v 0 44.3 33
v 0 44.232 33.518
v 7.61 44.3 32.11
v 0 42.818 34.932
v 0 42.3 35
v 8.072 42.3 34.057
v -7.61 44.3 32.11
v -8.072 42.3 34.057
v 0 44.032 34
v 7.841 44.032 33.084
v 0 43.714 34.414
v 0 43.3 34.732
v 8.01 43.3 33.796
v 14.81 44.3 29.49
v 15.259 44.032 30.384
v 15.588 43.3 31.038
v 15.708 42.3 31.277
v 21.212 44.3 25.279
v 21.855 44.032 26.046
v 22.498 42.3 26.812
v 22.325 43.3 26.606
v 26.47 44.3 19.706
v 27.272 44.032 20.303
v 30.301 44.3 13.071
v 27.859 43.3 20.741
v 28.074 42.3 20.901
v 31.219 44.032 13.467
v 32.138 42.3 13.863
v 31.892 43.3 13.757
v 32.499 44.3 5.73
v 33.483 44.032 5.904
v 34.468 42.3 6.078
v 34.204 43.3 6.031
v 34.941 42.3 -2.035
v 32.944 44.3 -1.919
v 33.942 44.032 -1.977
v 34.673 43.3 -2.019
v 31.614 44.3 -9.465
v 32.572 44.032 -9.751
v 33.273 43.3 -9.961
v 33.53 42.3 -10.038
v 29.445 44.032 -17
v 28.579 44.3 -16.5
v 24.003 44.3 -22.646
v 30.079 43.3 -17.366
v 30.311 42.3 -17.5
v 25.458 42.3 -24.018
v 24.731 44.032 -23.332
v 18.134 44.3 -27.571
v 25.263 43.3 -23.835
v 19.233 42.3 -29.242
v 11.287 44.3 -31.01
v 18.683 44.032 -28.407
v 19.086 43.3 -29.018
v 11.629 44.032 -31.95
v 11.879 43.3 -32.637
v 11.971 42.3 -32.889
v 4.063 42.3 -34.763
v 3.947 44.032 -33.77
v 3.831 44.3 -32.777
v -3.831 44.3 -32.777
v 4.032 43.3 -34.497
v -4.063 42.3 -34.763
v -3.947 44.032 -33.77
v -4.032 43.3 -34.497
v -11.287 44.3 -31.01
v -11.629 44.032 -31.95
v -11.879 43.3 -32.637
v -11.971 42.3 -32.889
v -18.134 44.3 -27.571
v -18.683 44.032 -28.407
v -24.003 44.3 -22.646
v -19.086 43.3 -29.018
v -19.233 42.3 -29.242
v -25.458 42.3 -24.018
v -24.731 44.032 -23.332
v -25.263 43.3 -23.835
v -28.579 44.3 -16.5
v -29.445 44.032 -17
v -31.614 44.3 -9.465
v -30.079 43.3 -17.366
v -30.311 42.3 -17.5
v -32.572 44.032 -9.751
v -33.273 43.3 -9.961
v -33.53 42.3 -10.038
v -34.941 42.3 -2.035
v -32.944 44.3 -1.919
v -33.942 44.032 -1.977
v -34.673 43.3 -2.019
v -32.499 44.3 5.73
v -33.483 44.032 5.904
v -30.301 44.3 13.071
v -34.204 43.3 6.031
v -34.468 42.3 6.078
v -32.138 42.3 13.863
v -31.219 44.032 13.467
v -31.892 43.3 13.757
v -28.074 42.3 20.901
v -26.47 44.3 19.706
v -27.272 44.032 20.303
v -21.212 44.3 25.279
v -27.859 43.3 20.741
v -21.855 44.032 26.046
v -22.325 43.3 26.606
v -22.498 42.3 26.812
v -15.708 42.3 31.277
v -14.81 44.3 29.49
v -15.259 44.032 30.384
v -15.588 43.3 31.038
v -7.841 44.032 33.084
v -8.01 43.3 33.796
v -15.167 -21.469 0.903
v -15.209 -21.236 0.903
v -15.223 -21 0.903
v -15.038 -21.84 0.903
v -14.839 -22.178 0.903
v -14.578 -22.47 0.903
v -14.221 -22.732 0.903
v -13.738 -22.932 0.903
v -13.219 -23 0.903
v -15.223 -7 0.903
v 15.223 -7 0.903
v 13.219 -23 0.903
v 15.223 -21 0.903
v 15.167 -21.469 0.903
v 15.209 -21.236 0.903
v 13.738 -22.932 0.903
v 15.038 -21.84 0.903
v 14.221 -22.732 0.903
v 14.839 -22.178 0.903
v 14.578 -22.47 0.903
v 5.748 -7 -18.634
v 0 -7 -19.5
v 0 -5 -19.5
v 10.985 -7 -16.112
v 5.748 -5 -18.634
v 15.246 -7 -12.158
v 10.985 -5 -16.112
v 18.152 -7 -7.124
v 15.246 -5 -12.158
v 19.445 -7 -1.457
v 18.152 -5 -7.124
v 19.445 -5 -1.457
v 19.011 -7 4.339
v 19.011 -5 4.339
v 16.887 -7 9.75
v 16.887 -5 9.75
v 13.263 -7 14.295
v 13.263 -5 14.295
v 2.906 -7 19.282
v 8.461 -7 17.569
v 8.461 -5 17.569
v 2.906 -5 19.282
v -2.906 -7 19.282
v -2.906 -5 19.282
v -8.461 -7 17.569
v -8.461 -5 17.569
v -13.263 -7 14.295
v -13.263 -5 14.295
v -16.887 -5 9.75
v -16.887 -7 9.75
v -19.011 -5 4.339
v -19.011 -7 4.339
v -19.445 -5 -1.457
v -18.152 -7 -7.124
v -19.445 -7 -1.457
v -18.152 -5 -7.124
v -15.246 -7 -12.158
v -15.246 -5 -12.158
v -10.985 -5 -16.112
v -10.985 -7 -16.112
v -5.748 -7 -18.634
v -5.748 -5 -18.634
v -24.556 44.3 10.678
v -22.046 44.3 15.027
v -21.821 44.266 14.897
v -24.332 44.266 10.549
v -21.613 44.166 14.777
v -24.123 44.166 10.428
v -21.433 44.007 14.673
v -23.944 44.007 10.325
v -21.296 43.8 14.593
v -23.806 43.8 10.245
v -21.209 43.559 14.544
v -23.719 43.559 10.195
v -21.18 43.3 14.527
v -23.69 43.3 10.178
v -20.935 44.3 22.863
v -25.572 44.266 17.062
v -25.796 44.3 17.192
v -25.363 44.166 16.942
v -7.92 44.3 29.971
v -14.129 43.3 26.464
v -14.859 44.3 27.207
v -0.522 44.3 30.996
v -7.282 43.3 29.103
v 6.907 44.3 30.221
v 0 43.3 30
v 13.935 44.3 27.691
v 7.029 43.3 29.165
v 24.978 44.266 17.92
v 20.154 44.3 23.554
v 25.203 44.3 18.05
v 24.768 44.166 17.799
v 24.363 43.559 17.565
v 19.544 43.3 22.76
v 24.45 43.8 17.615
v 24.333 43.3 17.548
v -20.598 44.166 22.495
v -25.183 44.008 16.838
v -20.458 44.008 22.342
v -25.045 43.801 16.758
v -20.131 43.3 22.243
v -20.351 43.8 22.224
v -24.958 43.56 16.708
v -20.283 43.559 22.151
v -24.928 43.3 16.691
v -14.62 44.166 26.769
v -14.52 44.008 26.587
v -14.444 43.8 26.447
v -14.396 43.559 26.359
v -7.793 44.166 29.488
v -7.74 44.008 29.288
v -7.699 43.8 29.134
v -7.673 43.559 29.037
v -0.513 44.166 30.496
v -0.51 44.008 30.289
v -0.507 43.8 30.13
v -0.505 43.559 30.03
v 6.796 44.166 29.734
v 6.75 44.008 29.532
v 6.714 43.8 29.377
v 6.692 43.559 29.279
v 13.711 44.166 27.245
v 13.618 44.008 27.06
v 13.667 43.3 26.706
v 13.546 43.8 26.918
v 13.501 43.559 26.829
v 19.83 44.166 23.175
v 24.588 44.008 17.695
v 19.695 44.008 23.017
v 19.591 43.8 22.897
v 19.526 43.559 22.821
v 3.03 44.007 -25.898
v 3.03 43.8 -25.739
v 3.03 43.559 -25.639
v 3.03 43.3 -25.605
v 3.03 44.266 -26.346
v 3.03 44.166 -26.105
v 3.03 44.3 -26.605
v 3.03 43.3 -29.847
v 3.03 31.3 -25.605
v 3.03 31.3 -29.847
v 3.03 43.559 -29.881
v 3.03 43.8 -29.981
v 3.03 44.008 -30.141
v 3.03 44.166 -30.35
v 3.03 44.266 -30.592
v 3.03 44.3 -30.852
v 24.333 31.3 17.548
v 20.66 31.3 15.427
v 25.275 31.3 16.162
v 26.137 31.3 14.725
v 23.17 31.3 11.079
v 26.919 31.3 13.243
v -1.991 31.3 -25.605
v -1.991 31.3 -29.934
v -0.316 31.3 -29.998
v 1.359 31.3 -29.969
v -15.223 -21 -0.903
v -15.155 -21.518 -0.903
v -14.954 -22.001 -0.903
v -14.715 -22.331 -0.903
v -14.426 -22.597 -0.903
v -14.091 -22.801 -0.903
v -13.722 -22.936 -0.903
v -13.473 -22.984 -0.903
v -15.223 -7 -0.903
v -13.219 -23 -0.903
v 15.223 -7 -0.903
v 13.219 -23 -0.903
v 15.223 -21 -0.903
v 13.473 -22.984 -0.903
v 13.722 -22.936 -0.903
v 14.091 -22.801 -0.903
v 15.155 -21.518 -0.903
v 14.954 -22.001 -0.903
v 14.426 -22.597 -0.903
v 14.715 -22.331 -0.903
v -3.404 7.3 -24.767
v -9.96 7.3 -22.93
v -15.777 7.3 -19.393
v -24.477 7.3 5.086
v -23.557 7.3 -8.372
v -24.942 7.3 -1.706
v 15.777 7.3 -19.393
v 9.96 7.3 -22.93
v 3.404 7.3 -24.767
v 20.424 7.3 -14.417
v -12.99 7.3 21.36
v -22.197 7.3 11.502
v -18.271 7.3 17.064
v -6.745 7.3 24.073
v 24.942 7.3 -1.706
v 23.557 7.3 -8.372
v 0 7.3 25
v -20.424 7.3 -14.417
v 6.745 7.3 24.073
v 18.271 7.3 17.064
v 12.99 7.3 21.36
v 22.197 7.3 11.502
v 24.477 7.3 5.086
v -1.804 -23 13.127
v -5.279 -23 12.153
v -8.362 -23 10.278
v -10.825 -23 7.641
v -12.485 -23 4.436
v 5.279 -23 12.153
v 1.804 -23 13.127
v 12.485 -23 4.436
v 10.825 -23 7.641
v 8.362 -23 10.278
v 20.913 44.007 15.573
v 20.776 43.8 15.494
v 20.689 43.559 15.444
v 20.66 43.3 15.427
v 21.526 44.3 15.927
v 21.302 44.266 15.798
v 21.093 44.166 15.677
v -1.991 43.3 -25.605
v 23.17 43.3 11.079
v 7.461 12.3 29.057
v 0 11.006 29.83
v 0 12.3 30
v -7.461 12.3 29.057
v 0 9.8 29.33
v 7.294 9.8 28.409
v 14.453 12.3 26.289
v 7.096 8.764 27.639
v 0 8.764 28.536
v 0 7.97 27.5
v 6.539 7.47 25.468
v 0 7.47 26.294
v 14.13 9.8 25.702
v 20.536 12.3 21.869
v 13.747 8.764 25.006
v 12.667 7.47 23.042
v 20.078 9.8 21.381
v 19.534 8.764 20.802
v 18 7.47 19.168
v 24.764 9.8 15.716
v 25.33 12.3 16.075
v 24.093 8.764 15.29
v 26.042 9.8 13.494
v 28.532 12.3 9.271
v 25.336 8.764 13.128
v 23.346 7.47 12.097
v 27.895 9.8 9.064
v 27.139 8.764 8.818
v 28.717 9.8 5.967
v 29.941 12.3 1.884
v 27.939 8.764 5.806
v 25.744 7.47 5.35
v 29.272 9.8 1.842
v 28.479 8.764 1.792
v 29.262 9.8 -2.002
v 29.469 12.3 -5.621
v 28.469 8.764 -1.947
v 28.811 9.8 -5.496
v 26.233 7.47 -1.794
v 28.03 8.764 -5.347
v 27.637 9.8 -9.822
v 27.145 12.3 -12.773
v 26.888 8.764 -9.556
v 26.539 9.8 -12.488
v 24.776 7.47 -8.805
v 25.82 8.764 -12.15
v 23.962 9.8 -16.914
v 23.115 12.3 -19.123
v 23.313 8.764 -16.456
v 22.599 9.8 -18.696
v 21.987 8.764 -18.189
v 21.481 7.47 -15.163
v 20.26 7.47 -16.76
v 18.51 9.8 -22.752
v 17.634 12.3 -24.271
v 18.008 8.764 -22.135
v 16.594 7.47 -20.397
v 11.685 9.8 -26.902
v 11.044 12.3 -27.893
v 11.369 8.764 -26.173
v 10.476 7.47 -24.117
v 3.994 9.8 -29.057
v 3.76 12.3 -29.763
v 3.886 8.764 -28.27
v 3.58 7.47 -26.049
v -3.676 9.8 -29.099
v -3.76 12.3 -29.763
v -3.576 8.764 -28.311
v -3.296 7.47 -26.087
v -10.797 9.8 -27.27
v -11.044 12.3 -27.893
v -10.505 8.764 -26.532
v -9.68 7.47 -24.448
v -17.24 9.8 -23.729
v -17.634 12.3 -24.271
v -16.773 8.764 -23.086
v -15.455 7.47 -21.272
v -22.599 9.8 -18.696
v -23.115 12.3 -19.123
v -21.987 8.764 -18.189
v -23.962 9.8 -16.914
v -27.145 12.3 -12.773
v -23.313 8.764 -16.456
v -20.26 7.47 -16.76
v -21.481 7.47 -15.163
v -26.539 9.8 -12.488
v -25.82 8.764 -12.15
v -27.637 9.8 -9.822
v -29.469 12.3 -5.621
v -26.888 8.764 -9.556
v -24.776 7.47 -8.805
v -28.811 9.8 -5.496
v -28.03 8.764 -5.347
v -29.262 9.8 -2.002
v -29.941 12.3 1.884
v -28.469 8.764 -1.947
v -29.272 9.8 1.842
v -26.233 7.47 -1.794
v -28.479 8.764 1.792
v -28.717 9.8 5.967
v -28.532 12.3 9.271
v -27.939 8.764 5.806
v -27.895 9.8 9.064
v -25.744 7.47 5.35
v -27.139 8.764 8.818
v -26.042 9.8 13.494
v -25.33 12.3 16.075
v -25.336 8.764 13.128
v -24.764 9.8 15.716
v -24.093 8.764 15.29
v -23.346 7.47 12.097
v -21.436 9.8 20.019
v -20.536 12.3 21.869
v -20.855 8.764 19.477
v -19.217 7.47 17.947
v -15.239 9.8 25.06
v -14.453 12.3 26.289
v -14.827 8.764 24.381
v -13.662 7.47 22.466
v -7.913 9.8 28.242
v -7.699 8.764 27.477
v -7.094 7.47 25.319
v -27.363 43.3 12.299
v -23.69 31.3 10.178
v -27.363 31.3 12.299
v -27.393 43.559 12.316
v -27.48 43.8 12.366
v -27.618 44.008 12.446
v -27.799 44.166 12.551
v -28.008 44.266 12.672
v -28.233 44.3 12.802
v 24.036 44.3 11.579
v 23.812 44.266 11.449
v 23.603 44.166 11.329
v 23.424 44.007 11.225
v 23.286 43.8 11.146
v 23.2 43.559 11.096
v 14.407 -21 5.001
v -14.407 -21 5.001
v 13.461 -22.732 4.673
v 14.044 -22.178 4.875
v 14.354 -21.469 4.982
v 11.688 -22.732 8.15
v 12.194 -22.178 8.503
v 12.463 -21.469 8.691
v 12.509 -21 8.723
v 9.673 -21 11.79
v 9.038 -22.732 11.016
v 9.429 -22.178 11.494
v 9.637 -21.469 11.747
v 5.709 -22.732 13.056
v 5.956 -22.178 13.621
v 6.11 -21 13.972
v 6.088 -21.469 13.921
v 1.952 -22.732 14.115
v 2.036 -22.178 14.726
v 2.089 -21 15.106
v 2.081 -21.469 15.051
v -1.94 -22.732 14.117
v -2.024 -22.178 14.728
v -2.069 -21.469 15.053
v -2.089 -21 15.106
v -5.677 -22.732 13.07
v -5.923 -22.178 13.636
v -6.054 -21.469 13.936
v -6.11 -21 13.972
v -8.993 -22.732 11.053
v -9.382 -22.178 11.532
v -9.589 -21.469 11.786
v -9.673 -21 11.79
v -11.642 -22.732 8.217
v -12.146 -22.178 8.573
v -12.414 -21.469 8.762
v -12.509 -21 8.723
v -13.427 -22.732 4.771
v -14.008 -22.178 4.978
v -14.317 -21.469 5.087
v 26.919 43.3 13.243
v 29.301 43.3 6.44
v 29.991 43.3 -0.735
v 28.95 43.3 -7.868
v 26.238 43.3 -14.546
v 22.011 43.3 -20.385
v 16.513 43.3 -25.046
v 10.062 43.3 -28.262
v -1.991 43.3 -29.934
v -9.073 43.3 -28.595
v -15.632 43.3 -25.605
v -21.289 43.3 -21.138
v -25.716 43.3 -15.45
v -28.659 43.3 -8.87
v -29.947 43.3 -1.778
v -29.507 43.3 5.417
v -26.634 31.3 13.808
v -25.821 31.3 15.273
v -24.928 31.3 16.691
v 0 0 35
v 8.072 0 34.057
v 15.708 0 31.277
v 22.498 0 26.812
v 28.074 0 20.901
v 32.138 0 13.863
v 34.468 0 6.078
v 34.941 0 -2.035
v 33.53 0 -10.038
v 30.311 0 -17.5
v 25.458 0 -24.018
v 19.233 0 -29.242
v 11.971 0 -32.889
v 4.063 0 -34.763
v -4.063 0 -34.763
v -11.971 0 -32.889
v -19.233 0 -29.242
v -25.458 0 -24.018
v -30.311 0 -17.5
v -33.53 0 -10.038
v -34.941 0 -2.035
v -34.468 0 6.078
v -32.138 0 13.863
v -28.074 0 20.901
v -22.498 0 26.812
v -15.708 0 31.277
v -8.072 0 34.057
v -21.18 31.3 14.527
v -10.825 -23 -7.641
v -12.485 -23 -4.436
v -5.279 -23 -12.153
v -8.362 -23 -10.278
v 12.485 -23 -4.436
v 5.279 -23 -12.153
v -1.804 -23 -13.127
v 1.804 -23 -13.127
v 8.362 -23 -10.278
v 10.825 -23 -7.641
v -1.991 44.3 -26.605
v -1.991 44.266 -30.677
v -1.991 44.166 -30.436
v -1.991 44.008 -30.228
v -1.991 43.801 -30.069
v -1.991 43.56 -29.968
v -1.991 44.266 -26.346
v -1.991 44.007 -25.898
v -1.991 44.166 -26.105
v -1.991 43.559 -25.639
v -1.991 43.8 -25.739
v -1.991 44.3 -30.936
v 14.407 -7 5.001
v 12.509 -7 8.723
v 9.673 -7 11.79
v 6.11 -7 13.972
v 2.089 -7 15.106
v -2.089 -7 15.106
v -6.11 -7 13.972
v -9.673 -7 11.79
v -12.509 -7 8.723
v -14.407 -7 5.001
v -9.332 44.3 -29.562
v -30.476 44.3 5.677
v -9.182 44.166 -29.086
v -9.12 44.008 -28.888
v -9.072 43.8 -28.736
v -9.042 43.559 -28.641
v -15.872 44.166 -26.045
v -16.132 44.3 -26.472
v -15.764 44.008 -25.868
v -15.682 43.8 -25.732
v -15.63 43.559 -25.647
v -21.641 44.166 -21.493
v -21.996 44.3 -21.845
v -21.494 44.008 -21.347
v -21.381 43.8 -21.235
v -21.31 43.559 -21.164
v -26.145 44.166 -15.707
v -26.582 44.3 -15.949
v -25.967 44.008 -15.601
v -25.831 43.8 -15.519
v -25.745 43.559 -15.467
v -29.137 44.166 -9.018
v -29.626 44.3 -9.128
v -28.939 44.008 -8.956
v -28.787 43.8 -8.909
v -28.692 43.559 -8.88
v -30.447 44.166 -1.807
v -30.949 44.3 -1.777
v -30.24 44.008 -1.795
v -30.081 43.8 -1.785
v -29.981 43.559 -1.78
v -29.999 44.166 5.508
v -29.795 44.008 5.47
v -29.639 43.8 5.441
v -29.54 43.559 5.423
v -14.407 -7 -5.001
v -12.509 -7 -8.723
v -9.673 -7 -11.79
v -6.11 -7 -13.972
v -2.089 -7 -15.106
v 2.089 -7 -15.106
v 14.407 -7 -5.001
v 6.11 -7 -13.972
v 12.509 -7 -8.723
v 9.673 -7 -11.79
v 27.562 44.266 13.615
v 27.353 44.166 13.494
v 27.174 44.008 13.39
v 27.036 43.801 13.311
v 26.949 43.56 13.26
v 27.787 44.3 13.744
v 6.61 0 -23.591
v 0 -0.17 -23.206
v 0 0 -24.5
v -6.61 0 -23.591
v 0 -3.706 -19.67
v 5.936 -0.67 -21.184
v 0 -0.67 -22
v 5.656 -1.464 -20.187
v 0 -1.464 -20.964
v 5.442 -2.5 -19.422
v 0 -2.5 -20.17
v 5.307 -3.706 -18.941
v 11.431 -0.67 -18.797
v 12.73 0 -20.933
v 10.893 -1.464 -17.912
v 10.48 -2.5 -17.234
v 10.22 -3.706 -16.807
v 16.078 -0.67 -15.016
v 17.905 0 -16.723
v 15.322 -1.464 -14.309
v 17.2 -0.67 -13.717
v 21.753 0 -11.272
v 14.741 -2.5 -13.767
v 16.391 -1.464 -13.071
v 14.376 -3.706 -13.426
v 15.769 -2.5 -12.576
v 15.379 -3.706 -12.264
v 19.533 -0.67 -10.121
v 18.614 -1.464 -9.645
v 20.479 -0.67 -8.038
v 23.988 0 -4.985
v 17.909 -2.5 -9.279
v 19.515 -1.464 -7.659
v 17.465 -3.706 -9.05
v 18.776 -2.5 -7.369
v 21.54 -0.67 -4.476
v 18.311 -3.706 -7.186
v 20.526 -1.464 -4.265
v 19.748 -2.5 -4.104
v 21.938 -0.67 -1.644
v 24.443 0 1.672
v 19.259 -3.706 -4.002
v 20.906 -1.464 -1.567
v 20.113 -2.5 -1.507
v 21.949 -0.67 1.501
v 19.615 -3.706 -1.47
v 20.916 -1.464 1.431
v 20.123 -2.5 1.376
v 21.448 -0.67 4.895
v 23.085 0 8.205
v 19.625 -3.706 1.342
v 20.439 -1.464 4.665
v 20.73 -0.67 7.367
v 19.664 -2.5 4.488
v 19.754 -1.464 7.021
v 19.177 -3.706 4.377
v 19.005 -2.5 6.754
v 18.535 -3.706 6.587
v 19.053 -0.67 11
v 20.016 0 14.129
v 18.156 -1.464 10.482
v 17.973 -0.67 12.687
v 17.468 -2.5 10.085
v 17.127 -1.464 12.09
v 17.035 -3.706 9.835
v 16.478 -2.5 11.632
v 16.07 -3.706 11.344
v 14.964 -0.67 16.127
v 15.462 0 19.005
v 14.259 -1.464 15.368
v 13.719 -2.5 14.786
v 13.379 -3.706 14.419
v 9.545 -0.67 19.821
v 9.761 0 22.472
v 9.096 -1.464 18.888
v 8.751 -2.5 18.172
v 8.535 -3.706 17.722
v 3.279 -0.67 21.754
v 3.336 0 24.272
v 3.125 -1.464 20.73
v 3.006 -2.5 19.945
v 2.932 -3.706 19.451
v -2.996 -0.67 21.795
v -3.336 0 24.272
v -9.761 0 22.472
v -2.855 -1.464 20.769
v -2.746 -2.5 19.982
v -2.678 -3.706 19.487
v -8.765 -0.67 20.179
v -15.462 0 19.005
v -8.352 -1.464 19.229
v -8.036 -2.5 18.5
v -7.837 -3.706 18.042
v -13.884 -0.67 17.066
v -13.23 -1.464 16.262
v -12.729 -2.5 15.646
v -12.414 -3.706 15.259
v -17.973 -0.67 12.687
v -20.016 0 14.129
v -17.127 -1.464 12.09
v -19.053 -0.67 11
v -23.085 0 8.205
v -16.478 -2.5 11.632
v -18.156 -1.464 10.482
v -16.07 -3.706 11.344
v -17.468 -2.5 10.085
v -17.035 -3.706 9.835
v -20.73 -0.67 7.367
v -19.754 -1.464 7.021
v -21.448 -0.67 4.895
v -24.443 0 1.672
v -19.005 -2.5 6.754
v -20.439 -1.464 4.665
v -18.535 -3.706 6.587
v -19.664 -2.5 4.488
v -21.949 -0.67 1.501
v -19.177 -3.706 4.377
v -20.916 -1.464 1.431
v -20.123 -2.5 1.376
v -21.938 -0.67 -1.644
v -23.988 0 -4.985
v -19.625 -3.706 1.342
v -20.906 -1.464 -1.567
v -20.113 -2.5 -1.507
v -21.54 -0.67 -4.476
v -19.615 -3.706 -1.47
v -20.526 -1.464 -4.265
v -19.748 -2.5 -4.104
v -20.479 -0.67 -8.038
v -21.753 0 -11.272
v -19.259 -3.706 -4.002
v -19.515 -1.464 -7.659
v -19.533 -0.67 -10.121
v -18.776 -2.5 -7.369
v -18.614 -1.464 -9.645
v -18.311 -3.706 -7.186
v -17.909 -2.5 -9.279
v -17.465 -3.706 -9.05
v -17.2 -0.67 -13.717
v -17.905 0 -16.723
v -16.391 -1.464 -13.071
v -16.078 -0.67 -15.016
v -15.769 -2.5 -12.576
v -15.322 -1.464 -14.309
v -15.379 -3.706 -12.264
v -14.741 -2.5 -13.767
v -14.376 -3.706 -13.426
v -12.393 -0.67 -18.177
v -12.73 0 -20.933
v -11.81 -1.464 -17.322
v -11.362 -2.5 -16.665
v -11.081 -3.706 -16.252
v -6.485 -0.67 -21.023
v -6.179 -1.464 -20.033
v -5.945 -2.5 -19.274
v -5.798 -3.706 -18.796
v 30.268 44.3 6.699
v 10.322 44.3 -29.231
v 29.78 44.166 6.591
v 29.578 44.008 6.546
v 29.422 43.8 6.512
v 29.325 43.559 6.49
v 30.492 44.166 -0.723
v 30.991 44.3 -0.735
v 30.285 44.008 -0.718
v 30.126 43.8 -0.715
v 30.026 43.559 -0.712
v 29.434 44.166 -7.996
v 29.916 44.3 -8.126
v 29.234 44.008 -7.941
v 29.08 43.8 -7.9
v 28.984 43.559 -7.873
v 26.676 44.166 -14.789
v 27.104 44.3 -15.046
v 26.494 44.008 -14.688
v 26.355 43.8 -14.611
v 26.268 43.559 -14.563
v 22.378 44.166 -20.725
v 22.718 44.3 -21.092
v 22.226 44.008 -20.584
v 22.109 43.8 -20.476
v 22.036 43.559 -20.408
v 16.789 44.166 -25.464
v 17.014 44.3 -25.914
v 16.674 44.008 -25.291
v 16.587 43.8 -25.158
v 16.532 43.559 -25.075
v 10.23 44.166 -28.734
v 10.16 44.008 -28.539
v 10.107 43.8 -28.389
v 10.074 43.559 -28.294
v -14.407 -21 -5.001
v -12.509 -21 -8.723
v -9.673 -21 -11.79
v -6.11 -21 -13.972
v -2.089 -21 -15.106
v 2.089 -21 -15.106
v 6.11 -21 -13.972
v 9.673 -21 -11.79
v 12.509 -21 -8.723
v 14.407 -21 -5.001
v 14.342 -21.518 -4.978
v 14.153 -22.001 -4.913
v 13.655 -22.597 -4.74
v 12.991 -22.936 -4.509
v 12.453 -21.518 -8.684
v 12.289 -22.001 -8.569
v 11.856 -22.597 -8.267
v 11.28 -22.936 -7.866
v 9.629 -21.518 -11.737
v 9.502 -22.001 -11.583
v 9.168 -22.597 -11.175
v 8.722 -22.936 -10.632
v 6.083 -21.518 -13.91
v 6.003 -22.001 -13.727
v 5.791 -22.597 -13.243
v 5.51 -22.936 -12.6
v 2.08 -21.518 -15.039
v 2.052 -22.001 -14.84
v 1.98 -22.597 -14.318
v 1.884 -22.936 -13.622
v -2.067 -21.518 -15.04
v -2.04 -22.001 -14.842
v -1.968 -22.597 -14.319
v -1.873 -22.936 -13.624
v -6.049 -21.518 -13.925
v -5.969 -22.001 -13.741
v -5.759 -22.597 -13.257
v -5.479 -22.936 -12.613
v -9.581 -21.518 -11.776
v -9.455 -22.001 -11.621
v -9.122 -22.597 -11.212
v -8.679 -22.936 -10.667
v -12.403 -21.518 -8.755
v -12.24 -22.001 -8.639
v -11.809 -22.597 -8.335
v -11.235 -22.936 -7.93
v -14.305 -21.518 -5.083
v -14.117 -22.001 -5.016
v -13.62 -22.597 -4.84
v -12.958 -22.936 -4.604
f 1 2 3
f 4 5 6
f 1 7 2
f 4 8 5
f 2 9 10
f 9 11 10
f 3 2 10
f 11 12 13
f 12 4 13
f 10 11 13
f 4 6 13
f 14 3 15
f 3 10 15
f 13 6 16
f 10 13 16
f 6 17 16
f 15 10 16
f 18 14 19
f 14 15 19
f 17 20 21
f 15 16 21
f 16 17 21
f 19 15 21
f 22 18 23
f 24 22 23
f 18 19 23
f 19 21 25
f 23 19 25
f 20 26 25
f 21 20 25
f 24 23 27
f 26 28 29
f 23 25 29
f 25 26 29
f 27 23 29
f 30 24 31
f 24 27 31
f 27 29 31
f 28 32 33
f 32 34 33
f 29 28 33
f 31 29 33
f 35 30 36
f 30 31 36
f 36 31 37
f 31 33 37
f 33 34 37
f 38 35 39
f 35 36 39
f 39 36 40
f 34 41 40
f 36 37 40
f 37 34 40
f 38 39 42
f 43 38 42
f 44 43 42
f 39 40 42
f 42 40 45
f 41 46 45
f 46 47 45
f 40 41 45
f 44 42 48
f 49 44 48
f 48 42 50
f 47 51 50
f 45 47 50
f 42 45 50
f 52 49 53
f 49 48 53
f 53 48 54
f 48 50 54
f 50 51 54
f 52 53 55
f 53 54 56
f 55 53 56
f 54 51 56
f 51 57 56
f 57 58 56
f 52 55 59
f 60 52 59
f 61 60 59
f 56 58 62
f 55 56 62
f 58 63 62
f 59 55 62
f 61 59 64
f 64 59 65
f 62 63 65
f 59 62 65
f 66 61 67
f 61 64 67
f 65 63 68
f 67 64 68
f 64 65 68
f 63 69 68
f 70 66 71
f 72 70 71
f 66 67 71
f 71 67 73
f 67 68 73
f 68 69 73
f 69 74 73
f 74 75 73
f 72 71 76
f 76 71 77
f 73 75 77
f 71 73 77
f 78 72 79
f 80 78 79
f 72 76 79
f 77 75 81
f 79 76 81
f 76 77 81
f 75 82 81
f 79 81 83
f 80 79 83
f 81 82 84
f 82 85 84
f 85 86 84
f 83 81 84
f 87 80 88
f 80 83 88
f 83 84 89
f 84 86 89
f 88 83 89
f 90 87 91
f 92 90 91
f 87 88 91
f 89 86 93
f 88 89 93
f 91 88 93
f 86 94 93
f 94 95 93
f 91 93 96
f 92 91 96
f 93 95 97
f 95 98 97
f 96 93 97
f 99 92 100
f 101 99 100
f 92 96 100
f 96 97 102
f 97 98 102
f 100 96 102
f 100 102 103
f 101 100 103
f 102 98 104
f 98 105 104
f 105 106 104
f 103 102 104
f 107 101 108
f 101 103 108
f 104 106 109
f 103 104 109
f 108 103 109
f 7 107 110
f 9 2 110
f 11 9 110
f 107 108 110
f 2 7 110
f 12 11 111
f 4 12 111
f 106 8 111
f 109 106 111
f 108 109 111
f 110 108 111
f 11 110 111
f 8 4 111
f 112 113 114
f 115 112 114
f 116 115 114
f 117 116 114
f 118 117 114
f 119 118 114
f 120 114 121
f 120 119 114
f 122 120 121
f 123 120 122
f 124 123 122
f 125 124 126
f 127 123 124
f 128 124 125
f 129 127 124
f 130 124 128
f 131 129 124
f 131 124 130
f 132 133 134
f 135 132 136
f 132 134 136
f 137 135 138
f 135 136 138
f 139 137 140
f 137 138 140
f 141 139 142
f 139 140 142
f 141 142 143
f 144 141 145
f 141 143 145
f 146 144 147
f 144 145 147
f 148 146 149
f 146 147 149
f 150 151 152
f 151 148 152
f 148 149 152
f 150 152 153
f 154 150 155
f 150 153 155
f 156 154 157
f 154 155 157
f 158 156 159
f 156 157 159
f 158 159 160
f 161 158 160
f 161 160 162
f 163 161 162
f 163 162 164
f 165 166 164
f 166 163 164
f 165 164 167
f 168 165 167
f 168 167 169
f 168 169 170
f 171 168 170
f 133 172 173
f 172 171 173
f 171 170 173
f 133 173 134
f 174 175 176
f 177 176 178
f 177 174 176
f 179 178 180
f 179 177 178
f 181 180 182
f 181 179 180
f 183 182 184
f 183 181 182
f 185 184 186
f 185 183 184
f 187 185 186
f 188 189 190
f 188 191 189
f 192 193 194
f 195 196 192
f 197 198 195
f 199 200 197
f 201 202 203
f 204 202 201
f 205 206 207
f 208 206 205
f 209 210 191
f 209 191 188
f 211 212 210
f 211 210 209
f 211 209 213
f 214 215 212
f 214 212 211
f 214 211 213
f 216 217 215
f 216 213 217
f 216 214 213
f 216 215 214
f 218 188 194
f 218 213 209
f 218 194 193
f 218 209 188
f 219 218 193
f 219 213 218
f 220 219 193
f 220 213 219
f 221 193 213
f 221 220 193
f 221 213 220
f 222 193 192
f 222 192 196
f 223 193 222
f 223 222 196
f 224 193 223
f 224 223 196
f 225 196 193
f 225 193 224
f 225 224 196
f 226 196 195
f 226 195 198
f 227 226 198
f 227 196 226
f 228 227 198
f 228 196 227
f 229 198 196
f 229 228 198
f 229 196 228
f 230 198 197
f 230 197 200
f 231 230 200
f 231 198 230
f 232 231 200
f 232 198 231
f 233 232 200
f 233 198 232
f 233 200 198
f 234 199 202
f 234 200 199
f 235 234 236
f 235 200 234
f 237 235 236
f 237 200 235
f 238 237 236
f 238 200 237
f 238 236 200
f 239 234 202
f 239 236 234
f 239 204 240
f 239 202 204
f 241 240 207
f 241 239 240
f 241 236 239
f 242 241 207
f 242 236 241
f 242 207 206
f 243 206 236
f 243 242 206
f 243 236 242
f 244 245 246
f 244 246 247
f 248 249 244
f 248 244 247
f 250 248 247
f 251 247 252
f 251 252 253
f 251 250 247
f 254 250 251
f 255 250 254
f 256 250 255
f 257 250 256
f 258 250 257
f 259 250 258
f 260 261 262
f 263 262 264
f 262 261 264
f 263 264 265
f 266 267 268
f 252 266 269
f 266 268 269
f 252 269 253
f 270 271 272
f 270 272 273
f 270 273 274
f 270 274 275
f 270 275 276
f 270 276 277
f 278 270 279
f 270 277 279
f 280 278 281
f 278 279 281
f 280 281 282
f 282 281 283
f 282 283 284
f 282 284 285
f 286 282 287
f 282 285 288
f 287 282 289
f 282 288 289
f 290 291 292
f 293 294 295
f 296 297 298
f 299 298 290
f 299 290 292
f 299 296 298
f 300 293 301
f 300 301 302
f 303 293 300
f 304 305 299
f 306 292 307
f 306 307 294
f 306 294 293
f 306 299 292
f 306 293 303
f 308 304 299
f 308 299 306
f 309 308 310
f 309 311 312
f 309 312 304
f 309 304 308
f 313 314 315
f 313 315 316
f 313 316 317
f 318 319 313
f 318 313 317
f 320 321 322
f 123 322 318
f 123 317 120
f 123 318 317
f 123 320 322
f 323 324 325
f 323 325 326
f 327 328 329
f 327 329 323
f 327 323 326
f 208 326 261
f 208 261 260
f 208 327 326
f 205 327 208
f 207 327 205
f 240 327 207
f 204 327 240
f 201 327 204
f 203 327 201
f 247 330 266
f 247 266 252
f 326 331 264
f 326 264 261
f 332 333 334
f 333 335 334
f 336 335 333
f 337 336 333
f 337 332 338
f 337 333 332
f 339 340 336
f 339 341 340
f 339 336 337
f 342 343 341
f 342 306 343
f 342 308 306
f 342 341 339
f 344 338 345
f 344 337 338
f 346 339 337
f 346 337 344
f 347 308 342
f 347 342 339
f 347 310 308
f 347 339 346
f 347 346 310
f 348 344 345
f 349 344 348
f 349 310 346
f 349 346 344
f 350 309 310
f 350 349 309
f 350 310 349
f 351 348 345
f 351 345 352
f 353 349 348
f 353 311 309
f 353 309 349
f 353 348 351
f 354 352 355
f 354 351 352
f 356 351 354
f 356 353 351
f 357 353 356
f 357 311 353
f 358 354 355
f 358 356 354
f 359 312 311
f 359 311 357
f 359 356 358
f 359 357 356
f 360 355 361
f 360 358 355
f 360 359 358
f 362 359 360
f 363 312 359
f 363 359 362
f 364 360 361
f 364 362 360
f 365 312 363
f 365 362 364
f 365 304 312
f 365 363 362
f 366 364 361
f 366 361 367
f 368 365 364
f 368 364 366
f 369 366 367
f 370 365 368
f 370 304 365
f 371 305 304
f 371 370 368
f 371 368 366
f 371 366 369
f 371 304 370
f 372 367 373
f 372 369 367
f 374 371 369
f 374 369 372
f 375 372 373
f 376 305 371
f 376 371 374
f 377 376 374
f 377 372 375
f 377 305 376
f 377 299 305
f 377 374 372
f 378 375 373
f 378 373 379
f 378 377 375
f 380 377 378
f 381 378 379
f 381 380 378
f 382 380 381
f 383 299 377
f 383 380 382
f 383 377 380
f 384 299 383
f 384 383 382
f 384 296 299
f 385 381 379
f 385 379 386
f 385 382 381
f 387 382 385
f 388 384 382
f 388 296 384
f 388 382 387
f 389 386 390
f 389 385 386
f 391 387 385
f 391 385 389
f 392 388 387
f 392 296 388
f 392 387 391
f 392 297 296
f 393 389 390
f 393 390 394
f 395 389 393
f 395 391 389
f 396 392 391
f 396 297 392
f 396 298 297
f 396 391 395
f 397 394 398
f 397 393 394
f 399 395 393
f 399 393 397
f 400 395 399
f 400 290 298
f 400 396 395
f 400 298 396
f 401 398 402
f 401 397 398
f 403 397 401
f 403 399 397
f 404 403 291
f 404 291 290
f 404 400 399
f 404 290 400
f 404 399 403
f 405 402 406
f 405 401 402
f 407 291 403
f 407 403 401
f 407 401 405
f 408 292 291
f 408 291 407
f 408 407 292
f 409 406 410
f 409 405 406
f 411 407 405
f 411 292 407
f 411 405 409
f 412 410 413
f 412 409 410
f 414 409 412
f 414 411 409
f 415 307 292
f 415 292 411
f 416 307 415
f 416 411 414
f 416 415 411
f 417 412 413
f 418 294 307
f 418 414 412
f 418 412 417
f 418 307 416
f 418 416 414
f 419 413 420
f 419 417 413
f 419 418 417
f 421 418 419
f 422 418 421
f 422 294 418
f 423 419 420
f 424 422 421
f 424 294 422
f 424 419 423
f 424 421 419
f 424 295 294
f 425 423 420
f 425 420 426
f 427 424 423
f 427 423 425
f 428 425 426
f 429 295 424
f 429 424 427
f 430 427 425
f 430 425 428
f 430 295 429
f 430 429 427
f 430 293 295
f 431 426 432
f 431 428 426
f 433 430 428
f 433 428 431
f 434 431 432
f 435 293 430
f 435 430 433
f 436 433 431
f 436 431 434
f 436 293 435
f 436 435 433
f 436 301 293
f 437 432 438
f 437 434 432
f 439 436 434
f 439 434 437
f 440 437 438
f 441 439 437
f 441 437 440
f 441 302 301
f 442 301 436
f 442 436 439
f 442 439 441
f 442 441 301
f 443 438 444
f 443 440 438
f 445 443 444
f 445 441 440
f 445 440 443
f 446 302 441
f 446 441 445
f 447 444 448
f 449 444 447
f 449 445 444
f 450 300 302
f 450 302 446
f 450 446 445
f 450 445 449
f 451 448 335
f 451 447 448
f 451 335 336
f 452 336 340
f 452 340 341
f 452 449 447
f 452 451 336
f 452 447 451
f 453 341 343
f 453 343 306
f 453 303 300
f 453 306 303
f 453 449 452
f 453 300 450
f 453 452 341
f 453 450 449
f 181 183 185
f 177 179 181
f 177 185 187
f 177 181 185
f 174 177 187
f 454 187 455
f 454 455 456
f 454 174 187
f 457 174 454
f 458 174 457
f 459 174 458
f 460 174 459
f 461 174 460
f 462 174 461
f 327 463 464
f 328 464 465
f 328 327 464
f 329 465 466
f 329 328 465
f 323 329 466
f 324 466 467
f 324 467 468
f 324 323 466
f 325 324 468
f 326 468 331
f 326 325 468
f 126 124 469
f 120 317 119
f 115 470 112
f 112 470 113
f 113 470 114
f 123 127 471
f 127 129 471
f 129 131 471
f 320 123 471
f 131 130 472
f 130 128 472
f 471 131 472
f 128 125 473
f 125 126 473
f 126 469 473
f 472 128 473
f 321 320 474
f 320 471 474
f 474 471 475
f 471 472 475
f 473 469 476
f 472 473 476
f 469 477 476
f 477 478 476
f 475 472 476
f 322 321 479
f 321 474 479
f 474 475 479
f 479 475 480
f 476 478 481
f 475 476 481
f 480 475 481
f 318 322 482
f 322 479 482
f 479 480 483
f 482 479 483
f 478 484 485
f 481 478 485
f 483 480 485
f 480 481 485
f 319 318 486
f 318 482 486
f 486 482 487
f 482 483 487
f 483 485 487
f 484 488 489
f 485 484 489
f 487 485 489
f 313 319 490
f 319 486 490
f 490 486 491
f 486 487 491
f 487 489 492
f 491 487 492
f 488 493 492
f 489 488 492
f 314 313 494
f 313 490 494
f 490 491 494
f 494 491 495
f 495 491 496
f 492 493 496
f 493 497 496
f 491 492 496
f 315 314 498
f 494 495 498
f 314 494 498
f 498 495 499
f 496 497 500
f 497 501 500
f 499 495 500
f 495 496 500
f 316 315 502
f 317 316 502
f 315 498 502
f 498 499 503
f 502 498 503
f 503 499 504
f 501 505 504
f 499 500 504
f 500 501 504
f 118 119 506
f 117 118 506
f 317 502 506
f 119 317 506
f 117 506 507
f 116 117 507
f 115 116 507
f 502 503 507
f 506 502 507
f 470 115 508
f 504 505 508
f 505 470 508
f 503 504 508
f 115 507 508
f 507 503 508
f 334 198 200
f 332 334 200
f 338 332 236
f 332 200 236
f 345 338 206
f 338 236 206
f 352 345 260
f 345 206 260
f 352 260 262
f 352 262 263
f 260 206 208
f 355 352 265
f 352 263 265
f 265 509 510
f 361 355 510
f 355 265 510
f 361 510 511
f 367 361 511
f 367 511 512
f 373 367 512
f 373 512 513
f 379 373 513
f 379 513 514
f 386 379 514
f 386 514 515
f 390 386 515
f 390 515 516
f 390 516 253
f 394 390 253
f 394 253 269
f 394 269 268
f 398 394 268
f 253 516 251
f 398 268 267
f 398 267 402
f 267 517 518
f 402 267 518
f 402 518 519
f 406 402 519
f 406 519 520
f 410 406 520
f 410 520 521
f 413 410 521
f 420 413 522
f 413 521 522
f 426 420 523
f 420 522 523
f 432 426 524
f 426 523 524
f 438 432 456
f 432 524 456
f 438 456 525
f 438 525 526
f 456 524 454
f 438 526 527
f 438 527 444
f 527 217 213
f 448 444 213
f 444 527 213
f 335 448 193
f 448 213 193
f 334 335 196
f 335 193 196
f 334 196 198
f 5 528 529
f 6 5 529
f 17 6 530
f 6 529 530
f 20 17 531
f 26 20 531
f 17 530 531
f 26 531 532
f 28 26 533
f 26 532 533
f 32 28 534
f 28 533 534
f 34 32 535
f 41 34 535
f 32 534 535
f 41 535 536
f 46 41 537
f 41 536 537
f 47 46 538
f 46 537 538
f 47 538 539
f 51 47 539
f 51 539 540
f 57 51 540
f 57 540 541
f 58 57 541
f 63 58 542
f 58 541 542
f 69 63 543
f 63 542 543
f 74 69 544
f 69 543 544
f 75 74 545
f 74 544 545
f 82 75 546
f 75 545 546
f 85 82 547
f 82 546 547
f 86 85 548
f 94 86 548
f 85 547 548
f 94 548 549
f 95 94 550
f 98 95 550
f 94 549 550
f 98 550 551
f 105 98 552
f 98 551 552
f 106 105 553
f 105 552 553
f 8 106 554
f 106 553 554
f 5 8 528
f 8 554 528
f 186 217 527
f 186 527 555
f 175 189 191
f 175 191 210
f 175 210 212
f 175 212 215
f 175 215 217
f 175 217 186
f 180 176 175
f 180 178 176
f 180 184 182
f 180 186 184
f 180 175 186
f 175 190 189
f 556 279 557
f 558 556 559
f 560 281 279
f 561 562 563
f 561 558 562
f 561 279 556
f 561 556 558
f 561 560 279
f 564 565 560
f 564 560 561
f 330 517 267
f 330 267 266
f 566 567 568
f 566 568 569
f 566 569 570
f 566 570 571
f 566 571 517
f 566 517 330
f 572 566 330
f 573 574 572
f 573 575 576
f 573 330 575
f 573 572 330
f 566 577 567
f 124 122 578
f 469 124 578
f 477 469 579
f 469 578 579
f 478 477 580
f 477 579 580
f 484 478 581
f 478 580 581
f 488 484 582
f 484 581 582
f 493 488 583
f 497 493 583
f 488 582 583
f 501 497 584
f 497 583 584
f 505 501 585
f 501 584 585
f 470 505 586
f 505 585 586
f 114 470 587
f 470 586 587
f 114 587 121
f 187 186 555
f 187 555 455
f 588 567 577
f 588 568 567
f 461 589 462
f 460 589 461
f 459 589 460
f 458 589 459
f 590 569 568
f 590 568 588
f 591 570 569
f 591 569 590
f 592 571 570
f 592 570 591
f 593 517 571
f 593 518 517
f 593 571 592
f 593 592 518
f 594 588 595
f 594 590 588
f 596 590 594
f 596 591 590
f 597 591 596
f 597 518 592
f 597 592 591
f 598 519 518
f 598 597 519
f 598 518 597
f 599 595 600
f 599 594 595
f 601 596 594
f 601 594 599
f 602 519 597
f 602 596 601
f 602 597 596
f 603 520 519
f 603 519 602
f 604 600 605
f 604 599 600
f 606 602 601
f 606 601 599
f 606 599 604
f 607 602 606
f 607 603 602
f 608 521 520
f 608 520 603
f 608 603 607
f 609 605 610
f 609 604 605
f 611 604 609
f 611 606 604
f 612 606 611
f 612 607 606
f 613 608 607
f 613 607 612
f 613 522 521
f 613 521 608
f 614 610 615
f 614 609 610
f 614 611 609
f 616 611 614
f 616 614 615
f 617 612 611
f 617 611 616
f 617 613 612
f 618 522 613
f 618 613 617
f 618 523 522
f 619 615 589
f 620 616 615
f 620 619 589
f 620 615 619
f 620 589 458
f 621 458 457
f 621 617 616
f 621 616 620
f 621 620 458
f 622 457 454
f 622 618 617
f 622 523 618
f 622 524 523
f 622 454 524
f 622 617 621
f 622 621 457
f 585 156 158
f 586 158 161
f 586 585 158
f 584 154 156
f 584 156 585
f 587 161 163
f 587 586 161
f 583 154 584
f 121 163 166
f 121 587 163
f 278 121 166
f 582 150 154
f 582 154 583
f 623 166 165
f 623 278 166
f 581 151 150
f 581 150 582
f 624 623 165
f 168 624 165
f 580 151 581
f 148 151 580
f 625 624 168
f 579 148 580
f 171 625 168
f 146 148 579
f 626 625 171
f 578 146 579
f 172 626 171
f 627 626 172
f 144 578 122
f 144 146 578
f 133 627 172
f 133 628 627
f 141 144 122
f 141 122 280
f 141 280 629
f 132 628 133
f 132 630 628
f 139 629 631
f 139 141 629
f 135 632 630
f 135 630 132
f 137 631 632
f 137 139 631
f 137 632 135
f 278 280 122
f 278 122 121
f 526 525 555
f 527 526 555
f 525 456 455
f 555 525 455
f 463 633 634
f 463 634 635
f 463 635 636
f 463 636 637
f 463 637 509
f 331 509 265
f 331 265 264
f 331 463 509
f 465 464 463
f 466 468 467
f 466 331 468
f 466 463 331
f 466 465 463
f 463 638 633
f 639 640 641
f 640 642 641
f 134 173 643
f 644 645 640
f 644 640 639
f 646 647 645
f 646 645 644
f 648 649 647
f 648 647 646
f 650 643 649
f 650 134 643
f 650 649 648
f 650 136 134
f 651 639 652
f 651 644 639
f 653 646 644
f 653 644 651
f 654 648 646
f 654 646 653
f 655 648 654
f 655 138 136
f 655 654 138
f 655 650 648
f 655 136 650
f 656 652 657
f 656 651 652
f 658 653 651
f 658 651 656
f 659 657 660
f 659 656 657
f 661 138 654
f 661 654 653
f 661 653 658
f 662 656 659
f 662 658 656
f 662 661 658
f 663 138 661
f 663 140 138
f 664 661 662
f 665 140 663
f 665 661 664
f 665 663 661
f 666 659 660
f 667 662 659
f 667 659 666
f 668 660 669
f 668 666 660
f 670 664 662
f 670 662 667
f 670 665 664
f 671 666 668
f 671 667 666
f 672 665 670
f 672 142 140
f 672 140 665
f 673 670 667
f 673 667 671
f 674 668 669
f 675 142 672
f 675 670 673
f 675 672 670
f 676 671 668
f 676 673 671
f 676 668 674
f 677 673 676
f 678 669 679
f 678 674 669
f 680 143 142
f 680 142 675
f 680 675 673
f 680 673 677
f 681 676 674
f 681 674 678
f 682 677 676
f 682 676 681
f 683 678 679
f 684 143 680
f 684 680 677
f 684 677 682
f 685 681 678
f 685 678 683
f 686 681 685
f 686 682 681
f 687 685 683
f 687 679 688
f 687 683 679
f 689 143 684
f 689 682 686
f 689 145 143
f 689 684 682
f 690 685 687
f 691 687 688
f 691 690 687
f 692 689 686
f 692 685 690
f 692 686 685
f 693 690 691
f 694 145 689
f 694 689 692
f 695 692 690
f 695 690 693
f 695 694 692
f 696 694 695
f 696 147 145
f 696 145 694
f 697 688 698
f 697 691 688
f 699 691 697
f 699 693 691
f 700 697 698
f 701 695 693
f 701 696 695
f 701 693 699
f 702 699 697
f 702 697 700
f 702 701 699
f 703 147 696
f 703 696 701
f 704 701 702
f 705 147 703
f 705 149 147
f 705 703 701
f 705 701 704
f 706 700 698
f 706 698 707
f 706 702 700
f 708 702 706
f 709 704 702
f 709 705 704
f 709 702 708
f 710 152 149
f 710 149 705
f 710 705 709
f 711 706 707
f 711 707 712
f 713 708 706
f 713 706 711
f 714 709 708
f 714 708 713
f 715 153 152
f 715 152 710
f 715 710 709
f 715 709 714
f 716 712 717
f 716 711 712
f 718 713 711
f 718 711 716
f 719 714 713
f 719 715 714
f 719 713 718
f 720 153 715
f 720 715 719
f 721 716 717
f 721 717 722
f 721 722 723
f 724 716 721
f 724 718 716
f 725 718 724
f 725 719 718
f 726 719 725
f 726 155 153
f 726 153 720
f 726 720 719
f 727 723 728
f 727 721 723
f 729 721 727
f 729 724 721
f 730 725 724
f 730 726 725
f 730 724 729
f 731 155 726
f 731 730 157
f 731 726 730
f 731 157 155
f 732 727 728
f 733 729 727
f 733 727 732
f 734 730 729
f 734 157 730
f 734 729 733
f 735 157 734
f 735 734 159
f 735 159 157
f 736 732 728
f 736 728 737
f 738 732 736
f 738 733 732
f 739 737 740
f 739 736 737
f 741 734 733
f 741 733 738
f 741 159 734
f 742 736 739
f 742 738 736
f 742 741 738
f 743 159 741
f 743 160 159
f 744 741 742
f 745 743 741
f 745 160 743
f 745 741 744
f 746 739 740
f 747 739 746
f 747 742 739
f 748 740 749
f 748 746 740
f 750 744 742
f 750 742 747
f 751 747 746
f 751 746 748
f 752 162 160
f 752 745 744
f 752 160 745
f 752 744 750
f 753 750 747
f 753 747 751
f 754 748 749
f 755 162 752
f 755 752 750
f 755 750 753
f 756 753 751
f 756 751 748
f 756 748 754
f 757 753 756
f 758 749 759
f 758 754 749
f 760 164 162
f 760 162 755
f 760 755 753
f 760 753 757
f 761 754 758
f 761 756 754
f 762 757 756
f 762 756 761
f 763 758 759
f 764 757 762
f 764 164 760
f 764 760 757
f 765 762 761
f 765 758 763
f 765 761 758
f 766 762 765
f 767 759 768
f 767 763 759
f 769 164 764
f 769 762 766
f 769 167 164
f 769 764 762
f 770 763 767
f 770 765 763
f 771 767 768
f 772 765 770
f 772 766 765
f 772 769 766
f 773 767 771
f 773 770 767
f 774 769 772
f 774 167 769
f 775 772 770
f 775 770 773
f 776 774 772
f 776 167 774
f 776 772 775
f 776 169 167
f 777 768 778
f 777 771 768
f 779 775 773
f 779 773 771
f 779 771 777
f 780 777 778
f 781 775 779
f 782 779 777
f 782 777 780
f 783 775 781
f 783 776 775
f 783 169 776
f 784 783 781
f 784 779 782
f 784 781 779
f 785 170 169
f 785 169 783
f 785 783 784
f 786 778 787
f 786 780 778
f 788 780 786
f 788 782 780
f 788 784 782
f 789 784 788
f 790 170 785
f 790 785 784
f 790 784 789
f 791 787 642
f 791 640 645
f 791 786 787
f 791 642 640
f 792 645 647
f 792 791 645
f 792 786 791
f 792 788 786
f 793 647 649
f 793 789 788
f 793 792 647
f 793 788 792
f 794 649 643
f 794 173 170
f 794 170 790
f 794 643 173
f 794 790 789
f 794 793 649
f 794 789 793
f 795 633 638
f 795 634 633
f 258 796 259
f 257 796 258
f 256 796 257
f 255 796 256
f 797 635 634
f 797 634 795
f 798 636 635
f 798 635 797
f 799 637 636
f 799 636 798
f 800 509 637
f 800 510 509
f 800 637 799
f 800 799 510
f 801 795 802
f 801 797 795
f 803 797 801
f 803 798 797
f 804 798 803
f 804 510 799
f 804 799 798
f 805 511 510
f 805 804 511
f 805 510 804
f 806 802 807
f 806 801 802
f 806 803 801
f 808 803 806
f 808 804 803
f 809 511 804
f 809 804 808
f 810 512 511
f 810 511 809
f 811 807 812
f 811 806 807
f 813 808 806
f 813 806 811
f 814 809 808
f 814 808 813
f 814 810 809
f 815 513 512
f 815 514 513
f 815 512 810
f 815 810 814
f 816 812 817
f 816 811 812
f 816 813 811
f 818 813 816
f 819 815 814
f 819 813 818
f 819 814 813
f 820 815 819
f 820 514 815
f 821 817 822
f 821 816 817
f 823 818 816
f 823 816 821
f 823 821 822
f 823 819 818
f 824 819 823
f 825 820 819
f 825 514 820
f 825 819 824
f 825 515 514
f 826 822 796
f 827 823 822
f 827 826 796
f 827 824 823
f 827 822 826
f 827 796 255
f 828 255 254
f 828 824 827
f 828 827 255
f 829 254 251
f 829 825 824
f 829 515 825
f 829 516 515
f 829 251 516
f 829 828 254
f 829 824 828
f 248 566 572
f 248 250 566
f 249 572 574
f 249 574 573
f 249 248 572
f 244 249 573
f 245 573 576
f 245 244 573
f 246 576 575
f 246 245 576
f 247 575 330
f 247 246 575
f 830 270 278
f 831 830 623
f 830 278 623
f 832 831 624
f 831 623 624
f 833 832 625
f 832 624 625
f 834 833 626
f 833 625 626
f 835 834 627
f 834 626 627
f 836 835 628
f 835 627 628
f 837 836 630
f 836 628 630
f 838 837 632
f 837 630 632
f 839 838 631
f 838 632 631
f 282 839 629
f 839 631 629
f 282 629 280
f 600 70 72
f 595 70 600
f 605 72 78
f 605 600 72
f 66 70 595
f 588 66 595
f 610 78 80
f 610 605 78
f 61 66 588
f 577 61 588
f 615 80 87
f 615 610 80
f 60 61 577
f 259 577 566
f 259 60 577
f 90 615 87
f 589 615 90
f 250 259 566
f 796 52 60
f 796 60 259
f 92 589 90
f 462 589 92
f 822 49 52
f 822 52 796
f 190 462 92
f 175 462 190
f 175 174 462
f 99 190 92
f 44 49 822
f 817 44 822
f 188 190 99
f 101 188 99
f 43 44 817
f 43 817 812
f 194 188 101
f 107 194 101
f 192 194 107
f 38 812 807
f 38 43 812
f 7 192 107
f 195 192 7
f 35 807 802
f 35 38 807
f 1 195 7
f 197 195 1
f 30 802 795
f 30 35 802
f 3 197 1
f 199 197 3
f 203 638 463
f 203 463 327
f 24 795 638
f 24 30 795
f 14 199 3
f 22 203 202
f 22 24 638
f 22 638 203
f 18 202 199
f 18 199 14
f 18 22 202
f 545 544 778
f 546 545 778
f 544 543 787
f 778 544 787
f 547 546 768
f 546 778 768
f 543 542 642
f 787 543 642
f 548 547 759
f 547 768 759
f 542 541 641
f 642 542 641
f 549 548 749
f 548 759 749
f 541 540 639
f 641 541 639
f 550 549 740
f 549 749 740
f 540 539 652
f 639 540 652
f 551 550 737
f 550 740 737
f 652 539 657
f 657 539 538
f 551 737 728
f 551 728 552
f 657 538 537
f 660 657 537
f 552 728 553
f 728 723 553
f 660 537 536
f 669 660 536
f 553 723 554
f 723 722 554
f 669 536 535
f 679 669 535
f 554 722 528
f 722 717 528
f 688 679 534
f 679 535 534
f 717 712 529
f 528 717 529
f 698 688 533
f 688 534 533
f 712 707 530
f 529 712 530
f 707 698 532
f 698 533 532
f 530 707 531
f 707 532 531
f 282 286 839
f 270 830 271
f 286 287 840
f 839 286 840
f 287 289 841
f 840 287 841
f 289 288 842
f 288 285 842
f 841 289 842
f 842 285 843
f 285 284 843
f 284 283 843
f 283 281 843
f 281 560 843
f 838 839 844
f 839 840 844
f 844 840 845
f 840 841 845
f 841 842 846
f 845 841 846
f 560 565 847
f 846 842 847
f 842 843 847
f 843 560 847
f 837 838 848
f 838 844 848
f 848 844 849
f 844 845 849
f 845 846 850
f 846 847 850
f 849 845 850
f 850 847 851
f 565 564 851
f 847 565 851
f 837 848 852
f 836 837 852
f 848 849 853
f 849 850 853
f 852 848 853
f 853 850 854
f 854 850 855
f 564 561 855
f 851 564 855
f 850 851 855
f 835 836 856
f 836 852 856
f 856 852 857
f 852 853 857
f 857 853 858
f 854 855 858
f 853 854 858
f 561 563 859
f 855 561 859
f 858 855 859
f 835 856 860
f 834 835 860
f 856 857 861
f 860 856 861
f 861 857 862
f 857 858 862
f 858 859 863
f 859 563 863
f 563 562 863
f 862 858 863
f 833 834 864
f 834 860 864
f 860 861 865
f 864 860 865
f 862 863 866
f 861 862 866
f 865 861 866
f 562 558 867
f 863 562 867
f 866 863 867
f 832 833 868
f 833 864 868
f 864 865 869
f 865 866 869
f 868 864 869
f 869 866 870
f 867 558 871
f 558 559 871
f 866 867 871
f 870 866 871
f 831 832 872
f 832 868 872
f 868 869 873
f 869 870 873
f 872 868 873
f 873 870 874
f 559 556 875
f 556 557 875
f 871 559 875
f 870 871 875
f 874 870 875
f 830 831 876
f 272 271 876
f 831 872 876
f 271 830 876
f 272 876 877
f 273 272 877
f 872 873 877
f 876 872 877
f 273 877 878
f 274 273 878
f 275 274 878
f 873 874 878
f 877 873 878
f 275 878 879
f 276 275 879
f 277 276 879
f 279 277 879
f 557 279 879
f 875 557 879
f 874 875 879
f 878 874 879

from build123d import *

# Parameters (mm, degrees)
SKETCH1_R           = 35
BOSS_EXTRUDE1_DEPTH = 44.3
SKETCH2_R           = 30
CUT_EXTRUDE1_DEPTH  = 37
SKETCH3_R           = 19.5
BOSS_EXTRUDE2_DEPTH = 7
SKETCH4_R           = 15.25
BOSS_EXTRUDE3_DEPTH = 16
FILLET1_R           = 5
BOSS_EXTRUDE4_DEPTH = 13
SKETCH7_W           = 66.193685288
SKETCH7_H           = 1.806726502
CUT_EXTRUDE2_DEPTH  = 16
FILLET2_R           = 2
FILLET3_R           = 5
FILLET4_R           = 2
FILLET5_R           = 1
FILLET6_R           = 1


with BuildPart() as part:
    # Sketch1 → Boss-Extrude1 (new body)
    with BuildSketch(Plane(origin=(0, 0, 0), x_dir=(1, 0, 0), z_dir=(0, 1, 0))):
        with Locations(Location((0, 0, 0), (0, 0, 270))):
            Circle(SKETCH1_R)
    extrude(amount=BOSS_EXTRUDE1_DEPTH)

    # Sketch2 → Cut-Extrude1 (cut)
    with BuildSketch(Plane(origin=(0, 44.3, 0), x_dir=(1, 0, 0), z_dir=(0, 1, 0))):
        with Locations(Location((0, 0, 0), (0, 0, 270))):
            Circle(SKETCH2_R)
    extrude(amount=-CUT_EXTRUDE1_DEPTH, mode=Mode.SUBTRACT)

    # Sketch3 → Boss-Extrude2 (add)
    with BuildSketch(Plane.XZ):
        with Locations(Location((0, 0, 0), (0, 0, 270))):
            Circle(SKETCH3_R)
    extrude(amount=BOSS_EXTRUDE2_DEPTH)

    # Sketch4 → Boss-Extrude3 (add)
    with BuildSketch(Plane.XZ.offset(7)):
        with Locations(Location((0, 0, 0), (0, 0, 270))):
            Circle(SKETCH4_R)
    extrude(amount=BOSS_EXTRUDE3_DEPTH)

    # Fillet1
    fillet1_edges = [part.edges().sort_by_distance(p)[0] for p in [
        (0, 0, 19.5),
    ]]
    fillet(fillet1_edges, radius=FILLET1_R)

    # Sketch5 → Boss-Extrude4 (add)
    with BuildSketch(Plane(origin=(0, 44.3, 0), x_dir=(1, 0, 0), z_dir=(0, 1, 0))):
        with BuildLine():
            Line((-1.990534123, 29.933890056), (-1.990534123, 25.605317076))
            Line((-1.990534123, 25.605317076), (3.030233114, 25.605317076))
            Line((3.030233114, 25.605317076), (3.030233114, 29.846569104))
            ThreePointArc((3.030233114, 29.846569104), (0.521679725, 29.995463828), (-1.990534123, 29.933890056))
        make_face()
        with BuildLine():
            Line((26.918776284, -13.243091911), (23.170122121, -11.07880542))
            Line((23.170122121, -11.07880542), (20.659738503, -15.426917394))
            Line((20.659738503, -15.426917394), (24.332770503, -17.547543408))
            ThreePointArc((24.332770503, -17.547543408), (25.715993811, -15.449519808), (26.918776284, -13.243091911))
        make_face()
        with BuildLine():
            Line((-24.928242161, -16.690798146), (-21.179587998, -14.526511655))
            Line((-21.179587998, -14.526511655), (-23.689971616, -10.178399682))
            Line((-23.689971616, -10.178399682), (-27.363003617, -12.299025696))
            ThreePointArc((-27.363003617, -12.299025696), (-26.237673536, -14.54594402), (-24.928242161, -16.690798146))
        make_face()
    extrude(amount=-BOSS_EXTRUDE4_DEPTH)

    # Sketch7 → Cut-Extrude2 (cut)
    with BuildSketch(Plane.XZ.offset(23)):
        Rectangle(SKETCH7_W, SKETCH7_H)
    extrude(amount=-CUT_EXTRUDE2_DEPTH, mode=Mode.SUBTRACT)

    # Fillet2
    fillet2_edges = [part.edges().sort_by_distance(p)[0] for p in [
        (0, -23, 15.25),
        (0, -23, -15.25),
    ]]
    fillet(fillet2_edges, radius=FILLET2_R)

    # Fillet3
    fillet3_edges = [part.edges().sort_by_distance(p)[0] for p in [
        (0, 7.3, -30),
    ]]
    fillet(fillet3_edges, radius=FILLET3_R)

    # Fillet4
    fillet4_edges = [part.edges().sort_by_distance(p)[0] for p in [
        (0, 44.3, -35),
    ]]
    fillet(fillet4_edges, radius=FILLET4_R)

    # Fillet5
    fillet5_edges = [part.edges().sort_by_distance(p)[0] for p in [
        (-25.715993811, 44.3, -15.449519808),
        (26.237673536, 44.3, -14.54594402),
        (-14.129332179, 44.3, 26.464352858),
    ]]
    fillet(fillet5_edges, radius=FILLET5_R)

    # Fillet6
    fillet6_edges = [part.edges().sort_by_distance(p)[0] for p in [
        (0.519849495, 44.3, -25.605317076),
        (21.914930312, 44.3, 13.252861407),
        (-22.434779807, 44.3, 12.352455669),
    ]]
    fillet(fillet6_edges, radius=FILLET6_R)


solid = part.part
